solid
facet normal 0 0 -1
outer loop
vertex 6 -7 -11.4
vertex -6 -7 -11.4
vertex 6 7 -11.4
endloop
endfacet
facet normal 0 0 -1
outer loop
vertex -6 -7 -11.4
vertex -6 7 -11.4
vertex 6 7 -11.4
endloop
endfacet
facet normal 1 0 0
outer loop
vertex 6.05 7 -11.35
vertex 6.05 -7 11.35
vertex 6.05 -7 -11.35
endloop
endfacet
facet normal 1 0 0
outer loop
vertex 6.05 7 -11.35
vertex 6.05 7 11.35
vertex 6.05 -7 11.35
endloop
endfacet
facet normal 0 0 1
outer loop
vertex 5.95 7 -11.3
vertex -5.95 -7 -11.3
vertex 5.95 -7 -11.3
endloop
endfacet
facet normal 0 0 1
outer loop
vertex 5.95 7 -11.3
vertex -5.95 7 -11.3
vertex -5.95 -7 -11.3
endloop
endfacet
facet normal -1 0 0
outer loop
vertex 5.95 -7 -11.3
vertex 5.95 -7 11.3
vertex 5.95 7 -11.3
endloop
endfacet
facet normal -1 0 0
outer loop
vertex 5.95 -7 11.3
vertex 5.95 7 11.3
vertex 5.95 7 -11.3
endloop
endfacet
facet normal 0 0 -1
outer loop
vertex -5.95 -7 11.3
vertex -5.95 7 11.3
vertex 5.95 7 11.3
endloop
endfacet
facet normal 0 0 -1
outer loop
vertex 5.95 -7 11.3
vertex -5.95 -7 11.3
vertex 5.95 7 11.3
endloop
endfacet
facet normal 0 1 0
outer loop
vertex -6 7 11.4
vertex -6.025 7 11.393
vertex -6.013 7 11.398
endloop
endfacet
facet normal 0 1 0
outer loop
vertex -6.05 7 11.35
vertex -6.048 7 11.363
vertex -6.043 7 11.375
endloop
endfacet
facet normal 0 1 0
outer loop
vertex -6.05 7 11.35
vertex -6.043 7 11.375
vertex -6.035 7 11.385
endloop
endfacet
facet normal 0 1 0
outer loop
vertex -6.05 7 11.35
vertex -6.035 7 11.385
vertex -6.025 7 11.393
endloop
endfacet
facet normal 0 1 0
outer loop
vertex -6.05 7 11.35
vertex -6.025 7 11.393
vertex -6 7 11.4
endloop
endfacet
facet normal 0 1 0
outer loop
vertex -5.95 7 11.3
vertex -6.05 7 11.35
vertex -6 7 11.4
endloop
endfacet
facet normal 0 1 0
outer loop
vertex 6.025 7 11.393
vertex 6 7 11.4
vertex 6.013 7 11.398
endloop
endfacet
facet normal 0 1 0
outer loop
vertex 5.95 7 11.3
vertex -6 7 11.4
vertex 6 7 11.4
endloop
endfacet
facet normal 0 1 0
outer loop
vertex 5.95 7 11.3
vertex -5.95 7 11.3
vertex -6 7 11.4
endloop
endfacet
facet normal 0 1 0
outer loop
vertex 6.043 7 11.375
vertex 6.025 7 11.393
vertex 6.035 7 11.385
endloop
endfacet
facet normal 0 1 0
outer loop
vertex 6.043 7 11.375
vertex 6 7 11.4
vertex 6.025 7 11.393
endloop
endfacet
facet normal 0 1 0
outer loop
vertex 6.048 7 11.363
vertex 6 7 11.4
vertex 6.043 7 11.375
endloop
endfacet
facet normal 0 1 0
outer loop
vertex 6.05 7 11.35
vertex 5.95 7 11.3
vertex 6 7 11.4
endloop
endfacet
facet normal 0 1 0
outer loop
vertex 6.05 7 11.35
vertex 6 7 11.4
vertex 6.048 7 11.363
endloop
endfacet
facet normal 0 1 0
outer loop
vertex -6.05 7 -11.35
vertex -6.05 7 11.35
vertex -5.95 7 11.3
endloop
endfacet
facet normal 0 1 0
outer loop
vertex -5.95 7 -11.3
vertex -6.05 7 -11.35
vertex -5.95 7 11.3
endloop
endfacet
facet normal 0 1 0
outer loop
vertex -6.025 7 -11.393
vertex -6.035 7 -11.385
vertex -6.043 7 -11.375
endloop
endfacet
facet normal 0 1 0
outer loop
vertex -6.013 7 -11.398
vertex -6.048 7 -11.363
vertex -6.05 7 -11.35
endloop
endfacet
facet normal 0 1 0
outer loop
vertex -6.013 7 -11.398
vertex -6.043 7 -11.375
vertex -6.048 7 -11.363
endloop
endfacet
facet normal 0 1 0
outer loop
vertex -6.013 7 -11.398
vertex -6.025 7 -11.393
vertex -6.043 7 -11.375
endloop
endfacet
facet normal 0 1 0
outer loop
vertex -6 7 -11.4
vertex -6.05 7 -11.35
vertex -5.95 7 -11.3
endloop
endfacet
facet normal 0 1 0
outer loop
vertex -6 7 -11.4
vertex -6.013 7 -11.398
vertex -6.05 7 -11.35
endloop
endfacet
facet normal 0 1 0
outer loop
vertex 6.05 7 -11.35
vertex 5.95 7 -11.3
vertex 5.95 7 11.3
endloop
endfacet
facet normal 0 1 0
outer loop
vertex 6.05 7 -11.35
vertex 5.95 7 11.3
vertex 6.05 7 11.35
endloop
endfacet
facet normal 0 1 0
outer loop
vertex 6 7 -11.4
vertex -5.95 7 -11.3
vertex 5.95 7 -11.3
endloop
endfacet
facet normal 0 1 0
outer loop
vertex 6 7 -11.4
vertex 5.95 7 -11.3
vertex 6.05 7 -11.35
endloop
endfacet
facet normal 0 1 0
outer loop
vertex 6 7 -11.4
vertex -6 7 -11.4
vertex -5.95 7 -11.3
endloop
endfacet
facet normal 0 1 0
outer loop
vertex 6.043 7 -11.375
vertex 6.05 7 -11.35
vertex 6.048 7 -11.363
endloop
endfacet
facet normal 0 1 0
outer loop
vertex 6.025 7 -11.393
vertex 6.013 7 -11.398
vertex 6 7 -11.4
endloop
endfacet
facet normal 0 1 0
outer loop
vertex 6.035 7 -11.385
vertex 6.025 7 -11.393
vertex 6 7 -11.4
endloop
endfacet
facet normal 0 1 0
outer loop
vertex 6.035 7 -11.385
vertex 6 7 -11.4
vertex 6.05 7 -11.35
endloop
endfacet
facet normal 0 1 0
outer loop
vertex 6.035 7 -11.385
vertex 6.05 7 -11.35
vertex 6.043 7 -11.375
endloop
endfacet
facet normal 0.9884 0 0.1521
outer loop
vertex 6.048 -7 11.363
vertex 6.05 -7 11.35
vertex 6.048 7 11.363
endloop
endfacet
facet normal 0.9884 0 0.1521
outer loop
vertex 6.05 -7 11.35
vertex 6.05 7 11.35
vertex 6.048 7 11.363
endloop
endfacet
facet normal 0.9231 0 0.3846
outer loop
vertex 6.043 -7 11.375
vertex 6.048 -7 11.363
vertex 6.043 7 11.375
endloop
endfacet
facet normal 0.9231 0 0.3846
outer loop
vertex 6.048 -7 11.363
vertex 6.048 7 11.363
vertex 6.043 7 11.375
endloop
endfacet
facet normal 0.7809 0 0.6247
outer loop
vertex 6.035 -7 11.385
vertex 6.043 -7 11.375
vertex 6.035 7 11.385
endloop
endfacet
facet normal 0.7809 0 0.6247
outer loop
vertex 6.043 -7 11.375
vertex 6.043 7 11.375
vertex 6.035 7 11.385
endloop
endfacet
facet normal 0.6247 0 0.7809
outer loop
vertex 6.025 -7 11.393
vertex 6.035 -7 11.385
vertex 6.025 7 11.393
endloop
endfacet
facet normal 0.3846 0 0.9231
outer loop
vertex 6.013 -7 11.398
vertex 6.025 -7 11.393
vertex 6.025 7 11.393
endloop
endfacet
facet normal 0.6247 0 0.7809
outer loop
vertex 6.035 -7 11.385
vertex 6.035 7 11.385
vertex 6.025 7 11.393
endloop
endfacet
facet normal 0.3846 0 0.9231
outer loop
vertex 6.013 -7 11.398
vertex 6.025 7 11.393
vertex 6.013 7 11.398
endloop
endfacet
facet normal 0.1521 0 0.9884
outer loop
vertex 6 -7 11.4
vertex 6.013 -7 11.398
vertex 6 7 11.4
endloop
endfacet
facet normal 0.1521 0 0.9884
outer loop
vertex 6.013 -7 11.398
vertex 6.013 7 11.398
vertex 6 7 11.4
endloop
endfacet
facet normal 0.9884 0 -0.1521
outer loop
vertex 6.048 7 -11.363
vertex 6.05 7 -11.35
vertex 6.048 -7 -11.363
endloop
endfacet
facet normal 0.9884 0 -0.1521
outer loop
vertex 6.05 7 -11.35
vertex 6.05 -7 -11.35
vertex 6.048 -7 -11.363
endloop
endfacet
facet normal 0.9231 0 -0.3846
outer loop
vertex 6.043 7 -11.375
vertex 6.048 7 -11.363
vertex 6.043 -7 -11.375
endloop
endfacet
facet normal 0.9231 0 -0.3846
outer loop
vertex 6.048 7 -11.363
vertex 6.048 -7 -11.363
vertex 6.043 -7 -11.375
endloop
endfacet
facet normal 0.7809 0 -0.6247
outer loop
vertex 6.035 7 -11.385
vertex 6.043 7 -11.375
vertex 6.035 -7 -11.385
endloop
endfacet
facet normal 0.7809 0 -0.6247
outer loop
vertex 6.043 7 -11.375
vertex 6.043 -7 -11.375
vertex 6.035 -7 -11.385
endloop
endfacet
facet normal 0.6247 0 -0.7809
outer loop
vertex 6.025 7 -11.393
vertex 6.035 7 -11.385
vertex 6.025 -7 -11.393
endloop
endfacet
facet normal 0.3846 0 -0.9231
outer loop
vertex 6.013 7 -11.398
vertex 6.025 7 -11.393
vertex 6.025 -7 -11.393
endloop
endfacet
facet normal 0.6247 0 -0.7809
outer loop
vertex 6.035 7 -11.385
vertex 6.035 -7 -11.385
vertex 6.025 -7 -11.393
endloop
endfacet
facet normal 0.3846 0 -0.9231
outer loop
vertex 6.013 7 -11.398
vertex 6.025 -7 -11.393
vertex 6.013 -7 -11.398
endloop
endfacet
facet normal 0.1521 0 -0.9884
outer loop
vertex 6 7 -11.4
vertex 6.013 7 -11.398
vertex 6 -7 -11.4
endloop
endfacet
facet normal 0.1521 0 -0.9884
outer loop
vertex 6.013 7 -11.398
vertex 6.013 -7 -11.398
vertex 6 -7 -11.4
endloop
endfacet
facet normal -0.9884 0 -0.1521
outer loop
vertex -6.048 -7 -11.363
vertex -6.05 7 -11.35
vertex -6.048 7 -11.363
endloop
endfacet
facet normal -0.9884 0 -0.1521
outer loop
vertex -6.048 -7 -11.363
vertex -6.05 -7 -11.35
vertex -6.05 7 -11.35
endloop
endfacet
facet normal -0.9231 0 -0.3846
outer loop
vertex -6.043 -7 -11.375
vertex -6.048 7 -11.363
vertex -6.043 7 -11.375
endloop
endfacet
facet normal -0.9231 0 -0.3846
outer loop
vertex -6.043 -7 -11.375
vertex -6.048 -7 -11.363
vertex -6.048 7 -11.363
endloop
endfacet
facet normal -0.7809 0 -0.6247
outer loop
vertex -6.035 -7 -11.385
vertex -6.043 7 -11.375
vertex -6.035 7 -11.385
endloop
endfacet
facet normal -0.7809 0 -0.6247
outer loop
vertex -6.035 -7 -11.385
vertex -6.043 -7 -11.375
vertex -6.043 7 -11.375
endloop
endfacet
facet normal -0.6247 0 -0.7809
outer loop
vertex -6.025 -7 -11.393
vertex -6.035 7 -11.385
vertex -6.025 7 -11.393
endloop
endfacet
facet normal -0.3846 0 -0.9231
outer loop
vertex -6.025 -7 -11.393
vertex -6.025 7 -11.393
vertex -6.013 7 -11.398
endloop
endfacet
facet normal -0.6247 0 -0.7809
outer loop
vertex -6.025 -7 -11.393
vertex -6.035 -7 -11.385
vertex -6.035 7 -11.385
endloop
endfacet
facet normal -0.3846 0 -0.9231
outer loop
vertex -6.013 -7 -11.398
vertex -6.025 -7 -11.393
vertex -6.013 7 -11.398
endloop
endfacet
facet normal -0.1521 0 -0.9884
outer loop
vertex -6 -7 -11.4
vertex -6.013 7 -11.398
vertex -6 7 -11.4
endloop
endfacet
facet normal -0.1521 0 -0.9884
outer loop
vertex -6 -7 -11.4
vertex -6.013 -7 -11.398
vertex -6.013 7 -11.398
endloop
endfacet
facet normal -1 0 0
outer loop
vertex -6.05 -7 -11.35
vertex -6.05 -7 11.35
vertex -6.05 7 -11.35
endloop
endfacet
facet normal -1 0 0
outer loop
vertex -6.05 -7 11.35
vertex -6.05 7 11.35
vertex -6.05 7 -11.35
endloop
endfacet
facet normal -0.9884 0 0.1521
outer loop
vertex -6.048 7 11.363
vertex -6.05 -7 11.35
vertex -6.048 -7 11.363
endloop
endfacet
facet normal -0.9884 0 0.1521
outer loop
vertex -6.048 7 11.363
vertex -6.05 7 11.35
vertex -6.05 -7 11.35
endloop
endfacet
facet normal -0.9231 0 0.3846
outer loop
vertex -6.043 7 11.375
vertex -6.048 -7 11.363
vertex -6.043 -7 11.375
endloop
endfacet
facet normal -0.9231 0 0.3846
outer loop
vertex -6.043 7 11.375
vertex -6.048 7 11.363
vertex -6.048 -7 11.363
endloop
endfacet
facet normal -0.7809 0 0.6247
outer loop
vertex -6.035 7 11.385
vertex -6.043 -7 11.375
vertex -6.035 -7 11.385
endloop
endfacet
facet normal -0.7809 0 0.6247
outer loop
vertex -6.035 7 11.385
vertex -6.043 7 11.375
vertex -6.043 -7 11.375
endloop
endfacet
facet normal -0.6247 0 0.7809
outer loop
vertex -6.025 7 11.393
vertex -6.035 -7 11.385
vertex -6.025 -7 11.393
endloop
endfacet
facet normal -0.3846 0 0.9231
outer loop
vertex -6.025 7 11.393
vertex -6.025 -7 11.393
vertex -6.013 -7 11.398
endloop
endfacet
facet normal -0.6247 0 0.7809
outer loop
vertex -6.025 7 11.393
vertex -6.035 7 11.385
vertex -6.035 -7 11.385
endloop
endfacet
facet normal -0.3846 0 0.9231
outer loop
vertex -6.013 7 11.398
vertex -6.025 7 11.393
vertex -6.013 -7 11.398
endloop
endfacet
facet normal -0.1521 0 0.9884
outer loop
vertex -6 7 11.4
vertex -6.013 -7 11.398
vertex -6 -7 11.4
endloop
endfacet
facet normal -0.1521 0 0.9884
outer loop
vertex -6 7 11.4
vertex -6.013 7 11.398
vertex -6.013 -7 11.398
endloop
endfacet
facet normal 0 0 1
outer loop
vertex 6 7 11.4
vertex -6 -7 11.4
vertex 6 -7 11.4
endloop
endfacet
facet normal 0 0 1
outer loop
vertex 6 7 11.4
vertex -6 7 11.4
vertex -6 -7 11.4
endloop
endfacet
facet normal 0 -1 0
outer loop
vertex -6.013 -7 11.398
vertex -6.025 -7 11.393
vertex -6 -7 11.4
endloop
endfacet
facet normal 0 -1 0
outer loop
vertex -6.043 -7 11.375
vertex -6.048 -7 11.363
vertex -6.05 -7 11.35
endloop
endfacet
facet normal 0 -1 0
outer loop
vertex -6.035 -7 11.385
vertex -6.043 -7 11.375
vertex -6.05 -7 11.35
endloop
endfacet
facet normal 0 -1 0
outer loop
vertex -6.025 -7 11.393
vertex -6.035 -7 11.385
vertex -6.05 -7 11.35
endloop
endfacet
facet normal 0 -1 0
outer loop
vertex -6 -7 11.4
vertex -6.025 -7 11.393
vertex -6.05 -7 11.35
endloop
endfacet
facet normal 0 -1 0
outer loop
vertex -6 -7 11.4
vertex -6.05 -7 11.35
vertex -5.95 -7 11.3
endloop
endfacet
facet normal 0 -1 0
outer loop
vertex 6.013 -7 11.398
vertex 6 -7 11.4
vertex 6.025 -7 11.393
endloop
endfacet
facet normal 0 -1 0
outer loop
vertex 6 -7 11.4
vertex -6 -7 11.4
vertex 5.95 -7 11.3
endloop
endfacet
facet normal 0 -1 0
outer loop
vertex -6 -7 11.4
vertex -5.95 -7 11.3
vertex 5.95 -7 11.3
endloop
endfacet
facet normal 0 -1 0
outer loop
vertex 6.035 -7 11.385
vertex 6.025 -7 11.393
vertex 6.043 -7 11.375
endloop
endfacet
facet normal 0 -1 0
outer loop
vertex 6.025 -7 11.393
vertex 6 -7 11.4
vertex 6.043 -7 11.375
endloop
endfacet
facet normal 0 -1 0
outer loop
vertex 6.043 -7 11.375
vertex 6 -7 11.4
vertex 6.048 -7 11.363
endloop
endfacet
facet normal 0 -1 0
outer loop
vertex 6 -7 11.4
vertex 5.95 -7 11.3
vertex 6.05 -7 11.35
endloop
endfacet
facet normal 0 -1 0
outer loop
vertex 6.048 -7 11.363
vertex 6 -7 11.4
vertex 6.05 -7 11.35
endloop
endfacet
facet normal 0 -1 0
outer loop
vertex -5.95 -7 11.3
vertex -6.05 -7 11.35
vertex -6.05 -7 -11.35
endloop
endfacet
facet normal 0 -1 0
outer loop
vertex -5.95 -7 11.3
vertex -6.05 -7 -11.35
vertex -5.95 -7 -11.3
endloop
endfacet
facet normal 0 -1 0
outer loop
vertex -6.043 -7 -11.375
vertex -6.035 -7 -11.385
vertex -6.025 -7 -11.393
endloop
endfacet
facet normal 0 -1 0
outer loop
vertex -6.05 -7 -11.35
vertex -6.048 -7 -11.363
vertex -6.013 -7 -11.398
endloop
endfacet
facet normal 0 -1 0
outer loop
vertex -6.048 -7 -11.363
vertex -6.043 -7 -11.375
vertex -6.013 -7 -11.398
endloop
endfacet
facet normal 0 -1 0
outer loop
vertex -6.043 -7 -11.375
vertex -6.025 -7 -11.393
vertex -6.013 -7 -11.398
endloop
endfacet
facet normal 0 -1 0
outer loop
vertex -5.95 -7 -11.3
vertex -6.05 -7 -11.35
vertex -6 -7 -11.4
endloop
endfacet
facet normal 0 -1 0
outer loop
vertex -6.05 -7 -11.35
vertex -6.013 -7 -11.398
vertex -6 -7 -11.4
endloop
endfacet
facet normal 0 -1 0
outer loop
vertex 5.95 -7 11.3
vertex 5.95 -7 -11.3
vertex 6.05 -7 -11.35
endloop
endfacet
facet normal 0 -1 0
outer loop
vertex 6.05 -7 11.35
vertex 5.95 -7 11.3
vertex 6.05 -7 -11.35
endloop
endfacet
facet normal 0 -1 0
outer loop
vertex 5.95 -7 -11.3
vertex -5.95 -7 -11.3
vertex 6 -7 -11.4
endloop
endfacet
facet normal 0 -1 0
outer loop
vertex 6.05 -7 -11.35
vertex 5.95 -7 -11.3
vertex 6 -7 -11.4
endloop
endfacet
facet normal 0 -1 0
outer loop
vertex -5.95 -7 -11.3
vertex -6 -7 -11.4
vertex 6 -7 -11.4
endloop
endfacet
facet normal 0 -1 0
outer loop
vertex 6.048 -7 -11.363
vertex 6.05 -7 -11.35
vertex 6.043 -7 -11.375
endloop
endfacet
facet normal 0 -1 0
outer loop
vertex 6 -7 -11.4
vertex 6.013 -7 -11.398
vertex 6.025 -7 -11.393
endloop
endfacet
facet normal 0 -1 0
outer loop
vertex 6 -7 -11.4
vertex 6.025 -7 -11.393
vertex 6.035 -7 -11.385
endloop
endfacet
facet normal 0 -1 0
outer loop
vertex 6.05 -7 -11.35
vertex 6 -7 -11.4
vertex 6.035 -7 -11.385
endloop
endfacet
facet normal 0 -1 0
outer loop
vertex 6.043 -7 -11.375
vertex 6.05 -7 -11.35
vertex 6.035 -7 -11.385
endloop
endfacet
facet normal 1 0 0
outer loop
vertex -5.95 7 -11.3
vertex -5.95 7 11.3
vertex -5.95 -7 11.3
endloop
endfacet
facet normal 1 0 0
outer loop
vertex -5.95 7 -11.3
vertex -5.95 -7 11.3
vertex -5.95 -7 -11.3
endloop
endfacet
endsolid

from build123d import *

# Parameters (mm, degrees)
SKETCH1_W           = 12.1
SKETCH1_H           = 22.8
SKETCH1_W_2         = 11.9
SKETCH1_H_2         = 22.6
EXTRUDE_THIN1_DEPTH = 7
FILLET1_R           = 0.05


with BuildPart() as part:
    # Sketch1 → Extrude-Thin1 (new body, symmetric)
    with BuildSketch(Plane(origin=(0, 0, 0), x_dir=(1, 0, 0), z_dir=(0, 1, 0))):
        Rectangle(SKETCH1_W, SKETCH1_H)
        Rectangle(SKETCH1_W_2, SKETCH1_H_2, mode=Mode.SUBTRACT)
    extrude(amount=EXTRUDE_THIN1_DEPTH, both=True)

    # Fillet1
    fillet1_edges = [part.edges().sort_by_distance(p)[0] for p in [
        (-6.05, 0, -11.4),
        (6.05, 0, -11.4),
        (6.05, 0, 11.4),
        (-6.05, 0, 11.4),
    ]]
    fillet(fillet1_edges, radius=FILLET1_R)


solid = part.part
